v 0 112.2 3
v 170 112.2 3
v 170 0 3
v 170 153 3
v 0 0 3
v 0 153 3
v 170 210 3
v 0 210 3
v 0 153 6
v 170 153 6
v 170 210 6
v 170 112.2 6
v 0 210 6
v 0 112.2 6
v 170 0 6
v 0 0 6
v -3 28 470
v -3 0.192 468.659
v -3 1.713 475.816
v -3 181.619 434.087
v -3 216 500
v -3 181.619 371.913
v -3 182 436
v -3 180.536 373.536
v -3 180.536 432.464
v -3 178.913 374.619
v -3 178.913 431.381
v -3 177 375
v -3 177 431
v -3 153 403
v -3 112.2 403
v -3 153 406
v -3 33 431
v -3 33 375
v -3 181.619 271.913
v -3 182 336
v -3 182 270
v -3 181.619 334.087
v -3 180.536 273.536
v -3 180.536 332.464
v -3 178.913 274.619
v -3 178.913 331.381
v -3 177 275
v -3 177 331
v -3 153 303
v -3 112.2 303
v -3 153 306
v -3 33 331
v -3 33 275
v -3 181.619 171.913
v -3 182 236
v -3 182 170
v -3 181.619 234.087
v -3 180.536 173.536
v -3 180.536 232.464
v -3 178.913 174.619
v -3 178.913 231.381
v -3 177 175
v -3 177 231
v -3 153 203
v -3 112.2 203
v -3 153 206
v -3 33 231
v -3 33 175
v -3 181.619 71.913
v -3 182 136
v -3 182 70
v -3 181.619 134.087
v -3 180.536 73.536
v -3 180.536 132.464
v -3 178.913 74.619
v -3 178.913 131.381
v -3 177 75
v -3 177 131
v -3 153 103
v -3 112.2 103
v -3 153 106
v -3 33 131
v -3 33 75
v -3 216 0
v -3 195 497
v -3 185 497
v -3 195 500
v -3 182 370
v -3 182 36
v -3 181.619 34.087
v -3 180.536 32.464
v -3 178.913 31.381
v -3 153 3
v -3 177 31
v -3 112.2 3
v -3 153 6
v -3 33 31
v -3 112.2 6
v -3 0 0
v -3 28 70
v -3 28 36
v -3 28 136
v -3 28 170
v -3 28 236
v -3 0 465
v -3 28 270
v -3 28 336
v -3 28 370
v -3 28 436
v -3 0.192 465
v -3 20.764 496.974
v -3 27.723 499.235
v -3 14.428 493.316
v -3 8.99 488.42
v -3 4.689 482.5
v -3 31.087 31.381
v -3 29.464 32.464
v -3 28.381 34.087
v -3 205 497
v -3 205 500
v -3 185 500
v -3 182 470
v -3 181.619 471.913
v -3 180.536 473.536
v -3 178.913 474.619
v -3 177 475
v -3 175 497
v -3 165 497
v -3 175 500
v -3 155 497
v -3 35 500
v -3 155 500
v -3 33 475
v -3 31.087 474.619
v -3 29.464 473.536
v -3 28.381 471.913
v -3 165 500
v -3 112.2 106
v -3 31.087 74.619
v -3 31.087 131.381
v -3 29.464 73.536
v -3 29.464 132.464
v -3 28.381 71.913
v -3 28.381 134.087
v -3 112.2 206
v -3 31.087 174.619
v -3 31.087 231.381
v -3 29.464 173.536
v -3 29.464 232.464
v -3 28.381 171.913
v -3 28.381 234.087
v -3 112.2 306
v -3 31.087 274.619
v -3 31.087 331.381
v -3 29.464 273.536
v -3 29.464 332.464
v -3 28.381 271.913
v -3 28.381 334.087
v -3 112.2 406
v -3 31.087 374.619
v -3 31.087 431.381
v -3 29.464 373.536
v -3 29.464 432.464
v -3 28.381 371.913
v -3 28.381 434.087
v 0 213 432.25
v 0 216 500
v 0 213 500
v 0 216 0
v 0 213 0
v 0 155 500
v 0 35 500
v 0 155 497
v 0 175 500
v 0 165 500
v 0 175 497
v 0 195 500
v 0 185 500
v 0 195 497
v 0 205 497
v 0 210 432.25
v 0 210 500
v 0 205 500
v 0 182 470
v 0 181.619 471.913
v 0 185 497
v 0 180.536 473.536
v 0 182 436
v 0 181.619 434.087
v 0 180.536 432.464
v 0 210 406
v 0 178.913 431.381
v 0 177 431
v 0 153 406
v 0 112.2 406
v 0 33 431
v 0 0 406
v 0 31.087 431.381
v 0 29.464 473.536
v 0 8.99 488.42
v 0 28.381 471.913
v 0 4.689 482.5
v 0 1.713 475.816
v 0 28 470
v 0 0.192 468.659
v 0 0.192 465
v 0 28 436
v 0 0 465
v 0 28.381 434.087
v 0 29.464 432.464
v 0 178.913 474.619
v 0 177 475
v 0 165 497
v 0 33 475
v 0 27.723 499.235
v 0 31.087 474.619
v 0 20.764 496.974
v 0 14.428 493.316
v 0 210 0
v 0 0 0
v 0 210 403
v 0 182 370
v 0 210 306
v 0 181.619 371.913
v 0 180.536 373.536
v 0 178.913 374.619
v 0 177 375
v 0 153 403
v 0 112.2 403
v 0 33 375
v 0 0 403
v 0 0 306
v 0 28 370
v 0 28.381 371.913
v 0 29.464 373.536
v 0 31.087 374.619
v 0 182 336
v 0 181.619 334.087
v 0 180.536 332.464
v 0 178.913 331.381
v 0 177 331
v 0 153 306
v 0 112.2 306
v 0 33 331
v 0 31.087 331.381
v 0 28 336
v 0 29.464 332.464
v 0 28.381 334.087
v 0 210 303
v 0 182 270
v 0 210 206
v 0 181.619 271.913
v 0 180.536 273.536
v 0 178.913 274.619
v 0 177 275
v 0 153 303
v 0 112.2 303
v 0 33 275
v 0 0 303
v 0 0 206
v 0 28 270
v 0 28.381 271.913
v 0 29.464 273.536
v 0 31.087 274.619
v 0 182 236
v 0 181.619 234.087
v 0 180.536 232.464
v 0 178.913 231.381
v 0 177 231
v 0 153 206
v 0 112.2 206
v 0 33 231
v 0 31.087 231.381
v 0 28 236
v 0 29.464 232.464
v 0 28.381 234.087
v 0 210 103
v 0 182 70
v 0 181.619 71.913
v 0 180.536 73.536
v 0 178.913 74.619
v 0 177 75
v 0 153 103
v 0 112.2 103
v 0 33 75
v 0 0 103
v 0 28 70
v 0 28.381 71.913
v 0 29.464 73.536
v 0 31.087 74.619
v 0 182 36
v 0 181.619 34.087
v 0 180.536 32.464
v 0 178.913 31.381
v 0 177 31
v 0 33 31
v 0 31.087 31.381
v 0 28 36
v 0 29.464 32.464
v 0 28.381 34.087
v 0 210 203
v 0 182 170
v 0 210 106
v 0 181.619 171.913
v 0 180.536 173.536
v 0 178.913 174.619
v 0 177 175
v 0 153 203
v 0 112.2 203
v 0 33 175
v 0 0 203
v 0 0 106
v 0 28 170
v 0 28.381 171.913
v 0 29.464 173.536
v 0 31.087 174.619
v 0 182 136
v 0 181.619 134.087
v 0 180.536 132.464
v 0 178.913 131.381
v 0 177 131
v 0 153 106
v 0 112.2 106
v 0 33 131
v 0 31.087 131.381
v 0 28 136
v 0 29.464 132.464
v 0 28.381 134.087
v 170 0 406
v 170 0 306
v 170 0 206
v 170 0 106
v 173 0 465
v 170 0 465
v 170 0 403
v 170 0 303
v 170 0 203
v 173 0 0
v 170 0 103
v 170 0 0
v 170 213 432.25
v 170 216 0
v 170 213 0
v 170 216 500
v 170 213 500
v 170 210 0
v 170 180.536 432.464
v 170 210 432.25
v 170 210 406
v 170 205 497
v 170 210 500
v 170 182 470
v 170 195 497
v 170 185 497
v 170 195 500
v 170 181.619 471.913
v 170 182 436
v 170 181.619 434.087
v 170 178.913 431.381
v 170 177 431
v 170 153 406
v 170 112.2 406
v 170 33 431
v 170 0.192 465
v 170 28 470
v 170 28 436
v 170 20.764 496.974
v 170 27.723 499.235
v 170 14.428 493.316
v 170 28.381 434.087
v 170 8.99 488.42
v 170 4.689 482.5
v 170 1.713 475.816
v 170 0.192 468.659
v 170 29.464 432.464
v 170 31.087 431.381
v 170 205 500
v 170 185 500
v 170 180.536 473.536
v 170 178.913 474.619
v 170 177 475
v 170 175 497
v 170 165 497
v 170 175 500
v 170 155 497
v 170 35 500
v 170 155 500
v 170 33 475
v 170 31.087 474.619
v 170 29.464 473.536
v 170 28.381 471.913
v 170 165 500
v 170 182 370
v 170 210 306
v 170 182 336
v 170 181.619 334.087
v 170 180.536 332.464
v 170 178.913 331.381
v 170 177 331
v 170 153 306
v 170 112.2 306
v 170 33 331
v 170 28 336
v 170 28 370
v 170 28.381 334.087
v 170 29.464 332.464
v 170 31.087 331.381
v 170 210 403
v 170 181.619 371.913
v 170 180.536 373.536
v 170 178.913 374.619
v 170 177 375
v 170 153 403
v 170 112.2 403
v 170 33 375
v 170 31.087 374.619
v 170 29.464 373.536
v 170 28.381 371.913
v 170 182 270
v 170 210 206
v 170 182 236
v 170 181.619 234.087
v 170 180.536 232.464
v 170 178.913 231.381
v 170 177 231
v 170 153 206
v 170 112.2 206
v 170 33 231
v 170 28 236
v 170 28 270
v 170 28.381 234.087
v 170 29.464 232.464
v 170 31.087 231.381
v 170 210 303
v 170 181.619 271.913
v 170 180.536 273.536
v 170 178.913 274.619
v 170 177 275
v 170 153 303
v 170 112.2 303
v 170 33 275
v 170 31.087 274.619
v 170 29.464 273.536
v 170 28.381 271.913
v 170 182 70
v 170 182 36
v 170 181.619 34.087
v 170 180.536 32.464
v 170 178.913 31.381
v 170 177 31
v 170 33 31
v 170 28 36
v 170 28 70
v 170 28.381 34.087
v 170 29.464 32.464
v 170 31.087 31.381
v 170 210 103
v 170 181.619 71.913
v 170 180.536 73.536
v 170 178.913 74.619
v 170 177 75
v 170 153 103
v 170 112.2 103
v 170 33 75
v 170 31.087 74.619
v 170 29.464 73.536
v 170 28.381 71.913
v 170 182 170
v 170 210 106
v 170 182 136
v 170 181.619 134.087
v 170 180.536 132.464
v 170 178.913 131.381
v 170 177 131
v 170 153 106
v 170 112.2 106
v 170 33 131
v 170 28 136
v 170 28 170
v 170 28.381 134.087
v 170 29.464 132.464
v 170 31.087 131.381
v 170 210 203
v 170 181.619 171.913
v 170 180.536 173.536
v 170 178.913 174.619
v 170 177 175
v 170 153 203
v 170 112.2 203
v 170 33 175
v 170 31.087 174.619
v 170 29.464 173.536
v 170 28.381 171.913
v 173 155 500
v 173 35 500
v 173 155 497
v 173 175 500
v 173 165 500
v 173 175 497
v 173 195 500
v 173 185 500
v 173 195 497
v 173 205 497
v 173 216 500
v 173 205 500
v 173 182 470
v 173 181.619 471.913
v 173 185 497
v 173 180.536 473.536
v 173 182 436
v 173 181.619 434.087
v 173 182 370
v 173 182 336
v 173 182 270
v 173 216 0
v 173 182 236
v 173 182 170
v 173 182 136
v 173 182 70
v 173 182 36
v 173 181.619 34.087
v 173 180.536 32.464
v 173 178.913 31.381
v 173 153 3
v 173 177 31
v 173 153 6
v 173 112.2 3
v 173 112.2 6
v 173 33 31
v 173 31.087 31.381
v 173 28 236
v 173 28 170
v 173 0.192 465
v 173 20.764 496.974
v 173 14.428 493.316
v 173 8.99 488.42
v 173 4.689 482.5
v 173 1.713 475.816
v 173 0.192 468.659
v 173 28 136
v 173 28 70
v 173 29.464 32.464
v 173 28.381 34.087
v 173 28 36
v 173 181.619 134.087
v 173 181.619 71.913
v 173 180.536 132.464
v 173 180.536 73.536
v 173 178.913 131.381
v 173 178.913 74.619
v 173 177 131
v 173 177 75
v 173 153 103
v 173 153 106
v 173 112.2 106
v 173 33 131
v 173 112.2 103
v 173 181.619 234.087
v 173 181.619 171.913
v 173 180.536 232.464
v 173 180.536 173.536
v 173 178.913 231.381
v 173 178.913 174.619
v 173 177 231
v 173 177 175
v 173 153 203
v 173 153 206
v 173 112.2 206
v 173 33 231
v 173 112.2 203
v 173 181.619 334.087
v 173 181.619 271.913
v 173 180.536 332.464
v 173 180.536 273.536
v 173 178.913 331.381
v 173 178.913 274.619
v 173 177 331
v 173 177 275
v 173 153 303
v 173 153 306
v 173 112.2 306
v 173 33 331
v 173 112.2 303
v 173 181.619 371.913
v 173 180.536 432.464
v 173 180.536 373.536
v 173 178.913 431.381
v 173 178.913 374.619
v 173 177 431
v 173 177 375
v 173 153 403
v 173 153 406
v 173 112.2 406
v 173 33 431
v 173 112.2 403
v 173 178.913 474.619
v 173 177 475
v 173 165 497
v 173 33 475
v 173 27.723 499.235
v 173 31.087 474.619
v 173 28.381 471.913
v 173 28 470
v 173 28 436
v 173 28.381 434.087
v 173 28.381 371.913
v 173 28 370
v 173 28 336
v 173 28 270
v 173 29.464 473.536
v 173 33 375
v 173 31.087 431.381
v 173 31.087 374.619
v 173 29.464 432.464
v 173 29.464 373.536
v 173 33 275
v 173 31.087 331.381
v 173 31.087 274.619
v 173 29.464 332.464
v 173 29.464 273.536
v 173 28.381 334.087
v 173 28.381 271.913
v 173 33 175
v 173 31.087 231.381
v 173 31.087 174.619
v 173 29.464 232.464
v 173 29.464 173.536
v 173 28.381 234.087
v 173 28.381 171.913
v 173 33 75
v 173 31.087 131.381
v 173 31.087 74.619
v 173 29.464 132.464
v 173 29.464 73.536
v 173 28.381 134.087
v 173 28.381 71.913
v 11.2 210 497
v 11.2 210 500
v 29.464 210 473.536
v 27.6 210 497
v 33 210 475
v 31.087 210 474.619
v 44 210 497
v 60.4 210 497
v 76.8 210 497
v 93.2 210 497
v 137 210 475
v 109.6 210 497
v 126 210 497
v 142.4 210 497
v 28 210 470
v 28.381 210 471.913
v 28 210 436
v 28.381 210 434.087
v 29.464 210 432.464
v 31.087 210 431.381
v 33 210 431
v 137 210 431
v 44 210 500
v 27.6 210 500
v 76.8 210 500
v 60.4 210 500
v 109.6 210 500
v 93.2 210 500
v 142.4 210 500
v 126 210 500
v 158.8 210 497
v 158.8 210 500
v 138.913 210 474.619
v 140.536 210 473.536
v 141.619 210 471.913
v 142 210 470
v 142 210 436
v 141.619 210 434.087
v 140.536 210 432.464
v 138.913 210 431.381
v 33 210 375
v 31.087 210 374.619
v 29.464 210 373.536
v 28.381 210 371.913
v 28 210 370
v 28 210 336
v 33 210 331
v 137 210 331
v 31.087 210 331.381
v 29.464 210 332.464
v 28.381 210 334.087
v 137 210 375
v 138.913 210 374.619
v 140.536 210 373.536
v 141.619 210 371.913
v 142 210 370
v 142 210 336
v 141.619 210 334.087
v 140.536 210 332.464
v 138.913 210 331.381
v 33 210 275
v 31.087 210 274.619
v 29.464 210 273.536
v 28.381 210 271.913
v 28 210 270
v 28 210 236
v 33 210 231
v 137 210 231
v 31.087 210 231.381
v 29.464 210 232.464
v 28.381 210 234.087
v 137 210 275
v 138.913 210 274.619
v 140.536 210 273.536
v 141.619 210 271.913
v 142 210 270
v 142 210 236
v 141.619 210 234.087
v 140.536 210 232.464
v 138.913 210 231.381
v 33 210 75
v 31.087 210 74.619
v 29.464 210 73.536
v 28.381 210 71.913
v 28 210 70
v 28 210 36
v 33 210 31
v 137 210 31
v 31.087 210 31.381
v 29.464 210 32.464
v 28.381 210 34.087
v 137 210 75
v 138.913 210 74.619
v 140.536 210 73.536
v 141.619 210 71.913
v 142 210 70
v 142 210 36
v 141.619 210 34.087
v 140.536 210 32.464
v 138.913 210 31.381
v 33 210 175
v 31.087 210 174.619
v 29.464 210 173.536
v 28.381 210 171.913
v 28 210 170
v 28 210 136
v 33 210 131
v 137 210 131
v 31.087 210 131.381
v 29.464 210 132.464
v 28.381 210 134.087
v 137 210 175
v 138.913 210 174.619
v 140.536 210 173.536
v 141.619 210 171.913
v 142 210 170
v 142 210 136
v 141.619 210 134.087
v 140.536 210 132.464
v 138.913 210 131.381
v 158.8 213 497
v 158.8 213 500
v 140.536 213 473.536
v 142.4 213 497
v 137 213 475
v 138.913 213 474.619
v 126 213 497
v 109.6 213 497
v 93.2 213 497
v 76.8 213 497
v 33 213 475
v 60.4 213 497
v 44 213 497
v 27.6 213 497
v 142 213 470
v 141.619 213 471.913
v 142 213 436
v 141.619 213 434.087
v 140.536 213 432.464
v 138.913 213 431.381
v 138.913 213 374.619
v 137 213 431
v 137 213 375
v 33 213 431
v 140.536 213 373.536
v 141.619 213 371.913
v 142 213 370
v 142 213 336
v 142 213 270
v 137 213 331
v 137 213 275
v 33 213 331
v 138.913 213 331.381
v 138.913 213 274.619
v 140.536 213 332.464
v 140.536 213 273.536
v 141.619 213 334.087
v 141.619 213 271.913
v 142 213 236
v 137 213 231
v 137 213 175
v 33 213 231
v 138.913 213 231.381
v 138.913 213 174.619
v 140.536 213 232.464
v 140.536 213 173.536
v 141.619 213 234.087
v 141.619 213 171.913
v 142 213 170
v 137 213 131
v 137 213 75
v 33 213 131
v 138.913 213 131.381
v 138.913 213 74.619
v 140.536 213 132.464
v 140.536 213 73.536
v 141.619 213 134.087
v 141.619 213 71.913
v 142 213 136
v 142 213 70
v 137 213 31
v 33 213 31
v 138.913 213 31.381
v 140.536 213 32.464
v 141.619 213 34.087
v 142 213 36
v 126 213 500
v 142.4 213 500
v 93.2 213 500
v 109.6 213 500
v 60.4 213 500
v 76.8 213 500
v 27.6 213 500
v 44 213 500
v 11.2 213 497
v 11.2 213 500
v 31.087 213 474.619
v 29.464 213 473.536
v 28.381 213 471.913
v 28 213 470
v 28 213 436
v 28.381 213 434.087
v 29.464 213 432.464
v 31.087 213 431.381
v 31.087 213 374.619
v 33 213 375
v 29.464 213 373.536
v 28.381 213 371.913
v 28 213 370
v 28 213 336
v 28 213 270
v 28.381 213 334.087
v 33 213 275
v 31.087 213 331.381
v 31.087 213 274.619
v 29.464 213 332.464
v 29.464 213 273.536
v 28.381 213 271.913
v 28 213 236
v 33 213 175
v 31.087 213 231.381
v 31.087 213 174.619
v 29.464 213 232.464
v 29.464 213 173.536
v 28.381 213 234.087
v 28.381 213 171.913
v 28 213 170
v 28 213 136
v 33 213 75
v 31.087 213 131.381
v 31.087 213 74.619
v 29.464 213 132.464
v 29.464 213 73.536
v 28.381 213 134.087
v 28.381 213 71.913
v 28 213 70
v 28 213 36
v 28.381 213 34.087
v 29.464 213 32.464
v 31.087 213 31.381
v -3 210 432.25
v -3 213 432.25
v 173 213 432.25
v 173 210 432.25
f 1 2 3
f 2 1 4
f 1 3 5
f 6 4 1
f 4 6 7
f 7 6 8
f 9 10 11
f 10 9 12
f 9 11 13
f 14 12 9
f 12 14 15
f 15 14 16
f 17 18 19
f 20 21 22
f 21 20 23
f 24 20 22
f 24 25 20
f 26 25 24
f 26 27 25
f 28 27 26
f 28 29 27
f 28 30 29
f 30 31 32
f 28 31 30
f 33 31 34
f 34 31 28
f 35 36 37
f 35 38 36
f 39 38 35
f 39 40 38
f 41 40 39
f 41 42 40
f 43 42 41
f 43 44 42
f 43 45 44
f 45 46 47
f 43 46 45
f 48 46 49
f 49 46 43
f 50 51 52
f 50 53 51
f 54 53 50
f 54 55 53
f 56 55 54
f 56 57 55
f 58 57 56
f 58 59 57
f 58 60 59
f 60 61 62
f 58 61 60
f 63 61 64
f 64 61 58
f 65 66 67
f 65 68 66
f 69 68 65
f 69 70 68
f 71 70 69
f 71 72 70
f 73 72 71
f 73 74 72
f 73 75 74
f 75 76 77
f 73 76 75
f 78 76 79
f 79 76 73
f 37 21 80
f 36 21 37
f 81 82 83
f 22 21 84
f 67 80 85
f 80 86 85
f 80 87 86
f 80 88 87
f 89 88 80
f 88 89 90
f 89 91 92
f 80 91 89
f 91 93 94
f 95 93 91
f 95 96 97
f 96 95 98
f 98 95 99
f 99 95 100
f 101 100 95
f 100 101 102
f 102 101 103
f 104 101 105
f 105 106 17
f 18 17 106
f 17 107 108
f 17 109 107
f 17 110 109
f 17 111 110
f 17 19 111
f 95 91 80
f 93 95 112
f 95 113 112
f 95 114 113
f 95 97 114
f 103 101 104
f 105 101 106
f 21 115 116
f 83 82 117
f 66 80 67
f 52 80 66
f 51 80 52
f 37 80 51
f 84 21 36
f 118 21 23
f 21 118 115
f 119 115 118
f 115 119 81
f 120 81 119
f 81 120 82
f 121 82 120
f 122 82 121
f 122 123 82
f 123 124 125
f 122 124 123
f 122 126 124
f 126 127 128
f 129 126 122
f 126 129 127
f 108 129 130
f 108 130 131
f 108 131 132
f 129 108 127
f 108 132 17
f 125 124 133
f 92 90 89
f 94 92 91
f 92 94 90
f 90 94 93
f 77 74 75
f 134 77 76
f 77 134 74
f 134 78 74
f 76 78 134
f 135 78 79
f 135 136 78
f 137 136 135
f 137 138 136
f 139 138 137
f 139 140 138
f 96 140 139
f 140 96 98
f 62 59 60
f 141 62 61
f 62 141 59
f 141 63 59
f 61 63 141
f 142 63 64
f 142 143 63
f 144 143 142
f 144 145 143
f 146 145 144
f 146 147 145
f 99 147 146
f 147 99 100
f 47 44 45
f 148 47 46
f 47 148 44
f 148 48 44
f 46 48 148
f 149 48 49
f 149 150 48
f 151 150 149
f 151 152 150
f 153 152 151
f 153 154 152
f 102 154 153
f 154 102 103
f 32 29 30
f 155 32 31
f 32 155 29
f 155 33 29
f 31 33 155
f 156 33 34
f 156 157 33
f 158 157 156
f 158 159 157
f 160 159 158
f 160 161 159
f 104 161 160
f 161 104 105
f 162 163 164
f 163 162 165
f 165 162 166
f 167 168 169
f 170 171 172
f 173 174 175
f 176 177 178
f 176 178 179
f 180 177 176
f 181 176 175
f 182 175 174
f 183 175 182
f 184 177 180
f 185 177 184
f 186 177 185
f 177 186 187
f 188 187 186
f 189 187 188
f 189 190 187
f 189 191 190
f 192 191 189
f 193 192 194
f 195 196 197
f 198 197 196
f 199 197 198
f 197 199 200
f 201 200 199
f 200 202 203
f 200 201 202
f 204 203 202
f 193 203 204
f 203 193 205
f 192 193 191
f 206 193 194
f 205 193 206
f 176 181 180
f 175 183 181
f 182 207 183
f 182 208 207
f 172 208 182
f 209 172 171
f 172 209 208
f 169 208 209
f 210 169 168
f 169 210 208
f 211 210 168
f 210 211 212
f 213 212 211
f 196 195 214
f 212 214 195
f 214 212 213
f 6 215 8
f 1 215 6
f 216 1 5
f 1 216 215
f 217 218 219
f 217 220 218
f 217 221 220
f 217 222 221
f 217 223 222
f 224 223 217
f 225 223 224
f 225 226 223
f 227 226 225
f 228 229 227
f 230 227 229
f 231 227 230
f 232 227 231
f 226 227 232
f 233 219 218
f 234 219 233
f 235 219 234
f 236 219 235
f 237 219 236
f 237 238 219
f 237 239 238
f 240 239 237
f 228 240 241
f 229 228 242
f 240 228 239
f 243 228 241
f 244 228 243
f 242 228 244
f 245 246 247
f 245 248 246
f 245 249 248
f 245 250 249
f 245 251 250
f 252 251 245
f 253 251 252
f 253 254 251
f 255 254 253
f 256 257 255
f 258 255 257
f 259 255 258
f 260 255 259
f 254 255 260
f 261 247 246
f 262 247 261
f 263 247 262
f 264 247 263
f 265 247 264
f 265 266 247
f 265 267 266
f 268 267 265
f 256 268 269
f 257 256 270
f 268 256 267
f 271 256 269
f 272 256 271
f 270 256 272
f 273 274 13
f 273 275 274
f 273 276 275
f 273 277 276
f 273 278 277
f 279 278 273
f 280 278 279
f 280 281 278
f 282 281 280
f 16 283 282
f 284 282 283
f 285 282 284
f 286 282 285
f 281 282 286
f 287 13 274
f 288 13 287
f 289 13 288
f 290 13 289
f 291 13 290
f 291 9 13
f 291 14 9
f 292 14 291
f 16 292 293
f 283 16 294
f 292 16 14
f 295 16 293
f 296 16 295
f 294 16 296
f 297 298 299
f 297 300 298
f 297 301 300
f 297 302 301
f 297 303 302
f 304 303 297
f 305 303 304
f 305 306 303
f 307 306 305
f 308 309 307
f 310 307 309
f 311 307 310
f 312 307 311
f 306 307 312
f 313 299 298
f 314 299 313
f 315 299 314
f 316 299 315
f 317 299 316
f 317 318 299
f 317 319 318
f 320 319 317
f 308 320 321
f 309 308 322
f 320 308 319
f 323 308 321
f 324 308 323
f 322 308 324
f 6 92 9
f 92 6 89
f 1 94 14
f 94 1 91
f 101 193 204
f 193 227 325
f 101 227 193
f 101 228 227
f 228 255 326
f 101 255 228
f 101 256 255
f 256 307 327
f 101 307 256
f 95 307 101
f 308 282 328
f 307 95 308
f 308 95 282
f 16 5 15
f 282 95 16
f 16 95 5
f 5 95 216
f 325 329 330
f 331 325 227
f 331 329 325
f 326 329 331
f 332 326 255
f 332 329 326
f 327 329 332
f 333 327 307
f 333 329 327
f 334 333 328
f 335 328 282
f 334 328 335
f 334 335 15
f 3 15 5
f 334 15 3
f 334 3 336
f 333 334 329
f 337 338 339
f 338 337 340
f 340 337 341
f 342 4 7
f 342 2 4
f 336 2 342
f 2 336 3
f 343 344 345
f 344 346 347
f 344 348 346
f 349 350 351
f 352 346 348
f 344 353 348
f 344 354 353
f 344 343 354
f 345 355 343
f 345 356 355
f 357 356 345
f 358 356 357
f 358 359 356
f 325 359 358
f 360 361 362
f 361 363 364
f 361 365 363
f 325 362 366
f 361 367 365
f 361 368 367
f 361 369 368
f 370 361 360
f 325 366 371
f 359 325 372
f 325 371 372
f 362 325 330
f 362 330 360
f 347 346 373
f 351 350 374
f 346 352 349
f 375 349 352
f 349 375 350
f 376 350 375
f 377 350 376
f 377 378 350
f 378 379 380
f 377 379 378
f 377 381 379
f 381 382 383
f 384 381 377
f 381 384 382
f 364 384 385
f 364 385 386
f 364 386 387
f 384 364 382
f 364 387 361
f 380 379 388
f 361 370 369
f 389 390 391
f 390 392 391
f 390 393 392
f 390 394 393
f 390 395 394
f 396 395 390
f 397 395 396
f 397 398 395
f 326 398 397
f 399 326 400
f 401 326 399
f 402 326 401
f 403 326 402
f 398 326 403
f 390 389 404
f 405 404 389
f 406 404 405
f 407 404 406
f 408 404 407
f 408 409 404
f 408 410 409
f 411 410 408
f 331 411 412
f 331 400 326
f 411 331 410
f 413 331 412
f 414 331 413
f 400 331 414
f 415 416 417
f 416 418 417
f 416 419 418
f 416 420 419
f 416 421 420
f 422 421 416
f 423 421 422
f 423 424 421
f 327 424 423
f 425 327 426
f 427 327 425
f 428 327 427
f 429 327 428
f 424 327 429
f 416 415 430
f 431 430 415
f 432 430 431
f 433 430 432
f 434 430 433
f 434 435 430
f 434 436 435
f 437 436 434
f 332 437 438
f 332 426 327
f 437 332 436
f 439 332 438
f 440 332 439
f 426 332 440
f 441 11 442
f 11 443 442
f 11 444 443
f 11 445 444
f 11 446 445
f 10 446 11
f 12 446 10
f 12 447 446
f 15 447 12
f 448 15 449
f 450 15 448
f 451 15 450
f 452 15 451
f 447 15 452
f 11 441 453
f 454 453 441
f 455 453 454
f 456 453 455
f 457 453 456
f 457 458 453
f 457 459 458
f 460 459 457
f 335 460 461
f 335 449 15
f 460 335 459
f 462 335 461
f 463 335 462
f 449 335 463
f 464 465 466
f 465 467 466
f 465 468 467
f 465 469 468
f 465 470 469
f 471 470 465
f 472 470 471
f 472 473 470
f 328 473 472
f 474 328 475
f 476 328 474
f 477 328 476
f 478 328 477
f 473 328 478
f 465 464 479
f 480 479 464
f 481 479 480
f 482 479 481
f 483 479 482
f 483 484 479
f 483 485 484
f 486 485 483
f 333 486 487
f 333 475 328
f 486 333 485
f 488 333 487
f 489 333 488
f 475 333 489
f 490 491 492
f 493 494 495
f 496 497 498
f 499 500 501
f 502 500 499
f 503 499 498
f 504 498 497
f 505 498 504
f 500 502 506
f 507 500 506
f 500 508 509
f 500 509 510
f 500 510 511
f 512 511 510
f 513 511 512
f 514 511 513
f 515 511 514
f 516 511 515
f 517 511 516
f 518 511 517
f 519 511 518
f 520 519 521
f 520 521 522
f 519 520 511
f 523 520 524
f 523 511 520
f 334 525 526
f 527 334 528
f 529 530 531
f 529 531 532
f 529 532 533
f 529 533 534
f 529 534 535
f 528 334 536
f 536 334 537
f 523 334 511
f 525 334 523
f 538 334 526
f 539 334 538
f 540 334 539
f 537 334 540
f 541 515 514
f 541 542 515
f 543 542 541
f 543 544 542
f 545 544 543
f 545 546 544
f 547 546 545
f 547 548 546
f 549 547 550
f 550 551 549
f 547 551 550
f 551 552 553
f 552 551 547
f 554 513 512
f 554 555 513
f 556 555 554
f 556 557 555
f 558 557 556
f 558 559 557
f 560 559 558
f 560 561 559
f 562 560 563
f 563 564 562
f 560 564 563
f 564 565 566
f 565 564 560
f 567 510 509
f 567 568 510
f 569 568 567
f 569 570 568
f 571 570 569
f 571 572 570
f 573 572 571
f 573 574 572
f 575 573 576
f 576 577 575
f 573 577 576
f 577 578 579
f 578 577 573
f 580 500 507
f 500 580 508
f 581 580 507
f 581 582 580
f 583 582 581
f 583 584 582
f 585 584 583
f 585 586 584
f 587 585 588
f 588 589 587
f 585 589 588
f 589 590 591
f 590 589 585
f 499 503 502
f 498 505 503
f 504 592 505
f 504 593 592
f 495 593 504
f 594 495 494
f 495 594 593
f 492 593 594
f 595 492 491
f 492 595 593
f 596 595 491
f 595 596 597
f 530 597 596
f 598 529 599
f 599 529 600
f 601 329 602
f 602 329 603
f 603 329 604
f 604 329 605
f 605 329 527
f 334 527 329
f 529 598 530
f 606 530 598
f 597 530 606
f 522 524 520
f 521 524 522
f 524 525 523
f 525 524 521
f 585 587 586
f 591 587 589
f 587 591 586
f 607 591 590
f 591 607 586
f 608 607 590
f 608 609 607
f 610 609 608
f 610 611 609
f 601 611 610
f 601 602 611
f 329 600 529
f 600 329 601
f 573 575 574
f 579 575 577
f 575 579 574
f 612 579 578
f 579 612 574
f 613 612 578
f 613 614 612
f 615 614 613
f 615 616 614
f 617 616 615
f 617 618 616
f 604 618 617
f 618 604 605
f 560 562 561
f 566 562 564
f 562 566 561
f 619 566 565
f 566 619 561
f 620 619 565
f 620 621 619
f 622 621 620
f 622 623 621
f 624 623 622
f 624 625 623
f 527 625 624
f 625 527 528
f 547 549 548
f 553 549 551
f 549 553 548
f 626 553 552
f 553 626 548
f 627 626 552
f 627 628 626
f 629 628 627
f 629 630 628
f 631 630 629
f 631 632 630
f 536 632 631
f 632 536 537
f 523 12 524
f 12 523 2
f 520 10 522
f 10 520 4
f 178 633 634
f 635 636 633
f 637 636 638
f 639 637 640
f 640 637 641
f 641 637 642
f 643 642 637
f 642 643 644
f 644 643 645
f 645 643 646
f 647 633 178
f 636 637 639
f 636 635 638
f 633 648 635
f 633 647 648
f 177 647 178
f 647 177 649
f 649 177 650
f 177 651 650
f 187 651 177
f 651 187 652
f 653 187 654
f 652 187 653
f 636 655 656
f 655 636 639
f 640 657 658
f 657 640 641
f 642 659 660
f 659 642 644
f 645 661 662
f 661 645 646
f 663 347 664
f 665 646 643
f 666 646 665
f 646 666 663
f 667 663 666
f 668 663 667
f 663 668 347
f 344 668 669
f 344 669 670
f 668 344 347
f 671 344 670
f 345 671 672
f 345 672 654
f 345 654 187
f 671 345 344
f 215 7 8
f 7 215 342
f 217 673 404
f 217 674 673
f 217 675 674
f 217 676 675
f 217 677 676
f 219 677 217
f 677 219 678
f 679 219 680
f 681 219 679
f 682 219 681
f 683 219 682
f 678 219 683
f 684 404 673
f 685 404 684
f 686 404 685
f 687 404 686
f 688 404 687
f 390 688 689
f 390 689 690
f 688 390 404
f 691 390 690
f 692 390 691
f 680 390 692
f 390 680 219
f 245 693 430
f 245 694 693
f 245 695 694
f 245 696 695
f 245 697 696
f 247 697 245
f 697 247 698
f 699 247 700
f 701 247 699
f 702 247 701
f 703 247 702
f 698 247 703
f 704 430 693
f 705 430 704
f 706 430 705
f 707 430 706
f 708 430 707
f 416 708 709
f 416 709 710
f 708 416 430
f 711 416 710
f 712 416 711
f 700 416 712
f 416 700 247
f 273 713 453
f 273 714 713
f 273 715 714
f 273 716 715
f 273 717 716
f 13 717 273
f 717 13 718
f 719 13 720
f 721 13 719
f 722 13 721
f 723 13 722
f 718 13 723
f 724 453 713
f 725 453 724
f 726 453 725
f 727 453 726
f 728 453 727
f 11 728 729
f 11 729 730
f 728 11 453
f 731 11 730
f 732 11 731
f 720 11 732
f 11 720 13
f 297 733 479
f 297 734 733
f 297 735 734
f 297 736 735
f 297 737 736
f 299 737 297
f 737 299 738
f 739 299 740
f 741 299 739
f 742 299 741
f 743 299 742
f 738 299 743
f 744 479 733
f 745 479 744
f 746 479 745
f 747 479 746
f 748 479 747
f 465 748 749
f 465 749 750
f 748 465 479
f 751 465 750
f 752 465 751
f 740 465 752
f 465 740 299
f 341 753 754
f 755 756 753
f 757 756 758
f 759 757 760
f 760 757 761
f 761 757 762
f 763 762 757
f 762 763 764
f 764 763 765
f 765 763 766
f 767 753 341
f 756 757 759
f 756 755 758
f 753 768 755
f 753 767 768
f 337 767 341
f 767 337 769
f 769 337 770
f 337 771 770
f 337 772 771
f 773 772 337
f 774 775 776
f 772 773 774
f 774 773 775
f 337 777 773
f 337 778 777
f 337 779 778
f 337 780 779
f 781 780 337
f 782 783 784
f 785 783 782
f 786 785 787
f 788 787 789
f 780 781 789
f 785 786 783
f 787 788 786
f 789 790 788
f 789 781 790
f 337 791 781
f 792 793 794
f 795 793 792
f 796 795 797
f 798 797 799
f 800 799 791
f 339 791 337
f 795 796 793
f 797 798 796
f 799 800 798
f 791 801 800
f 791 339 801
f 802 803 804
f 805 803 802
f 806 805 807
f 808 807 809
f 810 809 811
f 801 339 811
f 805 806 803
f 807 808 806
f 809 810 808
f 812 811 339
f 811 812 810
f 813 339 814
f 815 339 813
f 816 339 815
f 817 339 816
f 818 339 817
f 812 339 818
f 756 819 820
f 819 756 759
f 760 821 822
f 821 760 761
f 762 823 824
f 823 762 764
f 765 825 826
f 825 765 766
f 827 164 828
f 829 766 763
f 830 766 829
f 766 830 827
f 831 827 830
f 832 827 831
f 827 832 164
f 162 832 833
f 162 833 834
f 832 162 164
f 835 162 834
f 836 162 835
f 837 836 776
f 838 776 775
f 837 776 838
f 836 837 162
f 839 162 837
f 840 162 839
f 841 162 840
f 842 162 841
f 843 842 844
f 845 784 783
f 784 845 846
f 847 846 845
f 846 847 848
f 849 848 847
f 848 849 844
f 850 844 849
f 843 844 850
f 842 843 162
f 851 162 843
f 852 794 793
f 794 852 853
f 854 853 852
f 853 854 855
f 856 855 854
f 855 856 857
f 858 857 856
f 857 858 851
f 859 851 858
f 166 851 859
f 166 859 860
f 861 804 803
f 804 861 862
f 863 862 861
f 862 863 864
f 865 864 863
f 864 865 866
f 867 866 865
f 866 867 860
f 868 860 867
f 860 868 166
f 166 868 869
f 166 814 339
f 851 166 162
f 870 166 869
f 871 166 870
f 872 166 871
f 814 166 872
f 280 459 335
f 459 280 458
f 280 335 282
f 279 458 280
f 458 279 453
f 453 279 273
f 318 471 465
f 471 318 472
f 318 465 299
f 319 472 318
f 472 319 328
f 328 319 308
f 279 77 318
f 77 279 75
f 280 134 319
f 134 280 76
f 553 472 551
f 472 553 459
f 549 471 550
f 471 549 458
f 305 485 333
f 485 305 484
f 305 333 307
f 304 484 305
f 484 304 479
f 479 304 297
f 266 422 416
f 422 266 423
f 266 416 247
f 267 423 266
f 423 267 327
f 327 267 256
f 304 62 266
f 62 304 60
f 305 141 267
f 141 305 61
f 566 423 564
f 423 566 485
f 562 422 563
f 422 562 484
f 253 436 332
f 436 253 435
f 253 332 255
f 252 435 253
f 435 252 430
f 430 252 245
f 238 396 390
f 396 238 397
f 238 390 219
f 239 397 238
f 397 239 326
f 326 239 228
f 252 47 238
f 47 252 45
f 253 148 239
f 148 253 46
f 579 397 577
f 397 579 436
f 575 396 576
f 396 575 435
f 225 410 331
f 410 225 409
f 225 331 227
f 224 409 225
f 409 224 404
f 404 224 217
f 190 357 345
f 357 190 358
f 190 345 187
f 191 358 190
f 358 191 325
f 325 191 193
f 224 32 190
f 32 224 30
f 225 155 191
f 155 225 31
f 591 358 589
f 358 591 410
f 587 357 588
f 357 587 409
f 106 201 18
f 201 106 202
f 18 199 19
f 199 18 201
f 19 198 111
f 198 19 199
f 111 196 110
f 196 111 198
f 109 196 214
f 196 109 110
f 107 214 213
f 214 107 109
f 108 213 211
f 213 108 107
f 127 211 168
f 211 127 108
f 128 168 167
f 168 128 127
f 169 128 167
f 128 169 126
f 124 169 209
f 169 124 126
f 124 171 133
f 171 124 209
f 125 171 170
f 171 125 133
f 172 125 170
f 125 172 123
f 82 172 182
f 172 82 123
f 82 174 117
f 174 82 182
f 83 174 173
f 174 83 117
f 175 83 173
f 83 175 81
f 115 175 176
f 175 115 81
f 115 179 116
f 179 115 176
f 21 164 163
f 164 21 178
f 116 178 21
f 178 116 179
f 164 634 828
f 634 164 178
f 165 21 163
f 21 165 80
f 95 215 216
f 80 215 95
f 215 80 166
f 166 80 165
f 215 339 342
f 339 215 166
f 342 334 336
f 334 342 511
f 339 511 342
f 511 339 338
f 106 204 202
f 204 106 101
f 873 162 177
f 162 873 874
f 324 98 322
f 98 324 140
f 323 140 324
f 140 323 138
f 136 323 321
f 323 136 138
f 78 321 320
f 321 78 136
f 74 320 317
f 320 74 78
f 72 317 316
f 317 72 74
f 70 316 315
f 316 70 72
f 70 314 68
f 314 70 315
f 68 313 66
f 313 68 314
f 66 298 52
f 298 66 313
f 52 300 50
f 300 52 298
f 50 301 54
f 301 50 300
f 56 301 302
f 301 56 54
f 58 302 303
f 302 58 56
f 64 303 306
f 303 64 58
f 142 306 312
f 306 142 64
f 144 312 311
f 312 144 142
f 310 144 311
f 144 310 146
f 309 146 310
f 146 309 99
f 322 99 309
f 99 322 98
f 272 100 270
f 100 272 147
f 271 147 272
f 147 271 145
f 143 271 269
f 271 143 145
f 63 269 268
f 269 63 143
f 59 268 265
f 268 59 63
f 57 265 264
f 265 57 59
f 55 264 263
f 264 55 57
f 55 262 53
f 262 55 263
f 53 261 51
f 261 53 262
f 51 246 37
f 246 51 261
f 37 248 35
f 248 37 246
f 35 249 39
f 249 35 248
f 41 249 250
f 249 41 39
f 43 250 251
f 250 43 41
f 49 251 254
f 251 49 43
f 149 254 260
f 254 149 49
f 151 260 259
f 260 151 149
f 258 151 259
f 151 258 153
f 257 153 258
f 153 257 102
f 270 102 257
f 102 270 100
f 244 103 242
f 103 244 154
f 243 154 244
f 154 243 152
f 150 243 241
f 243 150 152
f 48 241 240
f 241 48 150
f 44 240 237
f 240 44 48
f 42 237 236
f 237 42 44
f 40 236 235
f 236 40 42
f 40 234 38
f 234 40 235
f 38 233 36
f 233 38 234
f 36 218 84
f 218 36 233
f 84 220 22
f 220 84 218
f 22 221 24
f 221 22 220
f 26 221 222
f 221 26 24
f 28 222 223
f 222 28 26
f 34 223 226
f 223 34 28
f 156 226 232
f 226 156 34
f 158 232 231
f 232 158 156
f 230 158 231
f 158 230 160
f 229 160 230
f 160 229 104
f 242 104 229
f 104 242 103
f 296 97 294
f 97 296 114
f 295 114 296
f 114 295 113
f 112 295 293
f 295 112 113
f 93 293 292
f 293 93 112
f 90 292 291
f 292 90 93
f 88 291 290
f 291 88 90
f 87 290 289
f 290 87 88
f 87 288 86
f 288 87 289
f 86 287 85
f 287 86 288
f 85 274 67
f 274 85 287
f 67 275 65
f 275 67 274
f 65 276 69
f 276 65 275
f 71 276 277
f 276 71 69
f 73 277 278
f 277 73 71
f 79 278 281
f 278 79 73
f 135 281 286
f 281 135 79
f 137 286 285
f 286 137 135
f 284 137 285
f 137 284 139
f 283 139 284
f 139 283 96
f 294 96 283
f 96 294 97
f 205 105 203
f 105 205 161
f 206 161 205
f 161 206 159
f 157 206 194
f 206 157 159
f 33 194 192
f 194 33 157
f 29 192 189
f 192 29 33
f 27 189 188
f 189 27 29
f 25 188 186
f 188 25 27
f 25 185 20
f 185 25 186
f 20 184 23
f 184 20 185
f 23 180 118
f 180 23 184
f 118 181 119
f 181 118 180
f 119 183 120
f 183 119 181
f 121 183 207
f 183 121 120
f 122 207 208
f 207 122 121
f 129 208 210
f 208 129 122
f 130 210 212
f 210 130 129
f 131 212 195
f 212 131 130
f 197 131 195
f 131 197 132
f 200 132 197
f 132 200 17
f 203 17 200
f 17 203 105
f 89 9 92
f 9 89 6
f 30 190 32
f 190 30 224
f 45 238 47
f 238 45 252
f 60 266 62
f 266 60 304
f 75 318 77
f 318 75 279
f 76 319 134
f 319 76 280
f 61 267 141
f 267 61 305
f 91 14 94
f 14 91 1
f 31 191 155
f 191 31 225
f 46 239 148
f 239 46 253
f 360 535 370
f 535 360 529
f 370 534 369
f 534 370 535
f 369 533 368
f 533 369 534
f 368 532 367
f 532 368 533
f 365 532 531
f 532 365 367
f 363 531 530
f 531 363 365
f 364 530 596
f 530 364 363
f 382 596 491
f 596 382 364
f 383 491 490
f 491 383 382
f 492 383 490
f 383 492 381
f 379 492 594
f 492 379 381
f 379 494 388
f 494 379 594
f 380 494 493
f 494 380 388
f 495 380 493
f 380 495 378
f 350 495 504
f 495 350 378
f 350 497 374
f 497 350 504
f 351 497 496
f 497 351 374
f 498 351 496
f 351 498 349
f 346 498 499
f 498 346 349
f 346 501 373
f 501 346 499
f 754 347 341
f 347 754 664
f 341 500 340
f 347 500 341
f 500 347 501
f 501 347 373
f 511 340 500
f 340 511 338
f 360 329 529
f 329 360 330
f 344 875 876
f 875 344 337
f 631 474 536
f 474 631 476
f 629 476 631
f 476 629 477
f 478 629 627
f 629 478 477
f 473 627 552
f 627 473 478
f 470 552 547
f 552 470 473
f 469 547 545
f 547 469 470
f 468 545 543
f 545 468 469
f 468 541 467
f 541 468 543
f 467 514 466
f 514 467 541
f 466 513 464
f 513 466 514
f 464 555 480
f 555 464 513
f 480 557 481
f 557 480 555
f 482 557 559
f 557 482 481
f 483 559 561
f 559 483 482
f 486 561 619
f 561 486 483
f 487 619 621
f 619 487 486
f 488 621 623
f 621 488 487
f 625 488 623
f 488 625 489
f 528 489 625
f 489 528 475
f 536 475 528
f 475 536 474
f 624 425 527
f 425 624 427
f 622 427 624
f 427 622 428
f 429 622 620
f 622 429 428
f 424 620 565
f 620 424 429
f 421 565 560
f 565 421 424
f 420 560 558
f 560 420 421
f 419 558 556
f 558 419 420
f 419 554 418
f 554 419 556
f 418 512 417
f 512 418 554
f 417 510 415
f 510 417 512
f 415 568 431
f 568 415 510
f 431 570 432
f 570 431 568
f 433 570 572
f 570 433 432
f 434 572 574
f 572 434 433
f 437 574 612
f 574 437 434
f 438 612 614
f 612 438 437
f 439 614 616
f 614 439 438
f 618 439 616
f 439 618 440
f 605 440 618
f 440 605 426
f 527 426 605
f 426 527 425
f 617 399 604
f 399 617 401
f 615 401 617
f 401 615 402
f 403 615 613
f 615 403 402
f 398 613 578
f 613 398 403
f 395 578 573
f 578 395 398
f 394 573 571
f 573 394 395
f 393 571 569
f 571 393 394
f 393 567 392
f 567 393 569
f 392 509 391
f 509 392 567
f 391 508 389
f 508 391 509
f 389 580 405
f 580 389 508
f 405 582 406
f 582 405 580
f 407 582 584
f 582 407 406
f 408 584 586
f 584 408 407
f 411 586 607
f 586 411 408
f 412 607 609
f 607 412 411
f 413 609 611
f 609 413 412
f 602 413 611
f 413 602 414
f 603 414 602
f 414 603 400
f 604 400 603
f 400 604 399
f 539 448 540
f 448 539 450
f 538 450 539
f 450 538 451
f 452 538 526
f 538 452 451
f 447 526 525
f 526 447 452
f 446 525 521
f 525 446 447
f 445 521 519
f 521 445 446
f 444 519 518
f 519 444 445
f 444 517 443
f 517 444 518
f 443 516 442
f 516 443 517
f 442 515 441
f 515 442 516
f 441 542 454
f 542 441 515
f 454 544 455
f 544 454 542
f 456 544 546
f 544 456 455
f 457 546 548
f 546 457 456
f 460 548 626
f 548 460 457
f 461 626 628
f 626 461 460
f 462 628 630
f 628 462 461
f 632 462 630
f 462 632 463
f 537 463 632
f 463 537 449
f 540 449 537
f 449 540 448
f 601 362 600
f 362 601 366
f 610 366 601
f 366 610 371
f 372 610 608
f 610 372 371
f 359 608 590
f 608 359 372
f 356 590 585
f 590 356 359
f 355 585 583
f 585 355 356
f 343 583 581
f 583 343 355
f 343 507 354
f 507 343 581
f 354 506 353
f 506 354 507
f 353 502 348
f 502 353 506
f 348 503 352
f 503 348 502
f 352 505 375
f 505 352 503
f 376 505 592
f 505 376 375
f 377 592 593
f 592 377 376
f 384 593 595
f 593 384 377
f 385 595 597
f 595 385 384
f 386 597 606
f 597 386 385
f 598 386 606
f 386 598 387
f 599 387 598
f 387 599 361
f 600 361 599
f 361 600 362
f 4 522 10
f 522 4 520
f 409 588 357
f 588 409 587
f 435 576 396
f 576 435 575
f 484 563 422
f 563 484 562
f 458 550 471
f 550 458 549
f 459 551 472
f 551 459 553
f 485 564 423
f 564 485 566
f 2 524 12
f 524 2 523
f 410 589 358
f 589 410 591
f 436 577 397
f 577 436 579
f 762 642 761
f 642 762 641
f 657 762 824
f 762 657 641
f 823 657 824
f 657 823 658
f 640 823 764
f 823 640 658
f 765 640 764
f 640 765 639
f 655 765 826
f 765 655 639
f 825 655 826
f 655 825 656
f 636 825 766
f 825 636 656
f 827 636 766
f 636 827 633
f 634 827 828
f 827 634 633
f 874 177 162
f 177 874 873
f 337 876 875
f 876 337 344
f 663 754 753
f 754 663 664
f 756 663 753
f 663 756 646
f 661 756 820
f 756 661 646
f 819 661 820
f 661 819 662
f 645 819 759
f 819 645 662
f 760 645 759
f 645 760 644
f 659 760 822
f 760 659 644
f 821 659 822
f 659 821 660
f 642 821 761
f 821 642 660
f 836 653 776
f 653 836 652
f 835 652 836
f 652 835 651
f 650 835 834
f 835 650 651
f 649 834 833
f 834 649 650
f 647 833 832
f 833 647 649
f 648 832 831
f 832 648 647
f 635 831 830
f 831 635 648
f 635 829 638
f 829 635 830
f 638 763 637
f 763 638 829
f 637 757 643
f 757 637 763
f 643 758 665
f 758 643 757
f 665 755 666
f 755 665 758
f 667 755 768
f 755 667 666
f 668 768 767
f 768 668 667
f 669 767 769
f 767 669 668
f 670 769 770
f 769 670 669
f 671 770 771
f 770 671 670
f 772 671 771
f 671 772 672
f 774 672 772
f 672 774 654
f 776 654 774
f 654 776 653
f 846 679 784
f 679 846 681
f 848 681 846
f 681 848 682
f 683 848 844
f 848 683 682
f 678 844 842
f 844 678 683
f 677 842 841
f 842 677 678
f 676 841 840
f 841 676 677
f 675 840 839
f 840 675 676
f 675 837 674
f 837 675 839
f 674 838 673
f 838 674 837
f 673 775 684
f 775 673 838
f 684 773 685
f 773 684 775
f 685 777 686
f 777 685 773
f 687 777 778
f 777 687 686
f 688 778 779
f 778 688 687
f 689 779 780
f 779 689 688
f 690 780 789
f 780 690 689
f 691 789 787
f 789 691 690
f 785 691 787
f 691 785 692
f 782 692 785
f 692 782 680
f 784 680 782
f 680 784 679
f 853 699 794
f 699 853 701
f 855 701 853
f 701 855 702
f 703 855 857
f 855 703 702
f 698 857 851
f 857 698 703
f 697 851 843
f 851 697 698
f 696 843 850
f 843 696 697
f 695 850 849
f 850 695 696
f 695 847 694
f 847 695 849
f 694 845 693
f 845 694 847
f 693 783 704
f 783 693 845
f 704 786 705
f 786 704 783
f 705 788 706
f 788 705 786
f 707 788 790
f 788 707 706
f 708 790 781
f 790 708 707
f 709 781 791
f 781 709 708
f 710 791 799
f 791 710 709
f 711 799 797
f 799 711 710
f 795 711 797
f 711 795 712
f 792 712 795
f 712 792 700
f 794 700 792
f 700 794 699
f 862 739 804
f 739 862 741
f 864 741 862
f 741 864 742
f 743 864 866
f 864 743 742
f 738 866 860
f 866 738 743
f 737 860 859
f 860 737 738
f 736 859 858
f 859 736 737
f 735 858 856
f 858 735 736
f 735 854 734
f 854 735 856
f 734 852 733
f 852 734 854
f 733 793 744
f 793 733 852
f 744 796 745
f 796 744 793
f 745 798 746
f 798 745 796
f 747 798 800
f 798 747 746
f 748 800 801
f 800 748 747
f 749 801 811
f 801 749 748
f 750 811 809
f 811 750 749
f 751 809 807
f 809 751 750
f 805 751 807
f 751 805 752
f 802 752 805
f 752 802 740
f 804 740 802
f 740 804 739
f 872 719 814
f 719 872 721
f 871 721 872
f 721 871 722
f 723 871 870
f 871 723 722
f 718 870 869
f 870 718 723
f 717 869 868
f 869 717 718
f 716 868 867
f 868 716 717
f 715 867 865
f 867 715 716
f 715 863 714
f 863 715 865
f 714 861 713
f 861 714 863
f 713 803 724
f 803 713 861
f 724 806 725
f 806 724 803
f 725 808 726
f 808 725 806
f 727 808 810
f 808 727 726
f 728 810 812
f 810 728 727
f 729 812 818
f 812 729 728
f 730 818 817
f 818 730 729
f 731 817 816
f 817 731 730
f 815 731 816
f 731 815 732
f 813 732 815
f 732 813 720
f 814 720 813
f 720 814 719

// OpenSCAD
////////////////////////////////////////////////////////////////////////////////////////////////////////////////
/// this script generates the cutting sketch for you laser cutter or cnc to make a desk shelves ////
// These shelves have been made initialy to hold my solder iron lab power supply pliers etc... ///
////////////////////////////////////////////////////////////////////////////////////////////////////////////////
//////////////////////////////// This script has been made by iX. ////////////////////////////////////////
//////// I've learnt openscad at Laboratoire Ouvert Grenoblois the Grenoble's hackerspace /////////
////////////////////////////// https://www.logre.eu/wiki/Accueil /////////////////////////////////////////
///////// can be found on thingiverse "maker desk shelves for laser cutter"  ////////////////////////
////////////////////////////////////////////////////////////////////////////////////////////////////////////////
////////////////// For bug repport, suggestions, say thank you, send me money //////////////////////
/////////////////////////// you can reach me at xbranca@gmail.com ///////////////////////////////////
////////////////////////////////////////////////////////////////////////////////////////////////////////////////
///////////// This is a remix from Mr clifford "Parametric Desktop Filing Rack"  ///////////////////
//////////////////////// https://www.thingiverse.com/thing:3084 ////////////////////////////////////////
///////////////////////// Thank you very much to him :) ////////////////////////////////////////////////
////////////////////////////////////////////////////////////////////////////////////////////////////////////////
///////////////  This is licensed as " 2-Clause BSD License " .. deal with it ! ///////////////////////
///////////////////////// https://opensource.org/licenses/bsd-license.php ///////////////////////////////
//////////////////////////////////////////////////////////////////////////////////////////////////////////////

/*
THIS SOFTWARE IS PROVIDED BY THE COPYRIGHT HOLDERS AND CONTRIBUTORS "AS IS" AND ANY EXPRESS OR IMPLIED WARRANTIES, INCLUDING, BUT NOT LIMITED TO, THE IMPLIED WARRANTIES OF MERCHANTABILITY AND FITNESS FOR A PARTICULAR PURPOSE ARE DISCLAIMED. IN NO EVENT SHALL THE COPYRIGHT HOLDER OR CONTRIBUTORS BE LIABLE FOR ANY DIRECT, INDIRECT, INCIDENTAL, SPECIAL, EXEMPLARY, OR CONSEQUENTIAL DAMAGES (INCLUDING, BUT NOT LIMITED TO, PROCUREMENT OF SUBSTITUTE GOODS OR SERVICES; LOSS OF USE, DATA, OR PROFITS; OR BUSINESS INTERRUPTION) HOWEVER CAUSED AND ON ANY THEORY OF LIABILITY, WHETHER IN CONTRACT, STRICT LIABILITY, OR TORT (INCLUDING NEGLIGENCE OR OTHERWISE) ARISING IN ANY WAY OUT OF THE USE OF THIS SOFTWARE, EVEN IF ADVISED OF THE POSSIBILITY OF SUCH DAMAGE.
*/

////////////////////////////////////////////////////////////////////////////////
//select the mode you want to render
// shapes --> 2D cutting view to export in dxf
// 3Dview --> rendering of the desk shelves once assembled
// test --> test mode in case you wanna display only one element to modify it
mode =
//	"shapes";
	"3dview";
//  "test";

////////////////////////////////////////////////////////////////////////////////
// Your shelves parameters

//number of shelves you want
num_shelves = 4;
//extra height on top of the upper shelf
extra_h = 100;
//Half diameter of the ronded angle of the upper self
round_r = 35;

//dimensions
shelf_width = 170;
shelf_depth = 210;
shelf_h = 100;

//depth of the tool older
top_tool_holder_depth = 60;

total_h = num_shelves*shelf_h + extra_h;
echo("total_h =",total_h);

//set the thickness of the material you wanna use
thickness = 3;

// number of locks in each direction
locks_h = 10;
locks_d = 5;
locks_w = 5;
nb_locks_top = 3;

//screw_drivers
nb_screw_drivers = 6;
diameter_screw_drivers = 6;
dist_screw_driver_to_edge = 12;

// amount of wood around pliers holders
margin_around_pliers = 5;

// number cases on the tool holder
nb_case = 6;

//size of window edges
//define the amout of wood let around the windows opened on side and back of the shelves
window_edges = 25;
//rounds around the shelves
window_round = 5;

//////////////////////////////////////////////////////////////////////////////////////
////////////////////// internal script computation ///////////////////////////////
// You shouldn't have to midify it unless you wanna hack this script //////
//////////////////////////////////////////////////////////////////////////////////////

//pliers_case_size = (top_tool_holder_depth - diameter_screw_drivers - 15 -10)/2 ;
pliers_case_size_x = (shelf_width - (nb_case+1)*margin_around_pliers)/nb_case ;
pliers_case_size_y = (top_tool_holder_depth - 2*dist_screw_driver_to_edge - diameter_screw_drivers/2 - 1*margin_around_pliers) /2 ;

//compute size of Z/h locks
//locks_h = nb_of_lock_z;
locks_width_h = (total_h - (2*thickness))/(2*locks_h);
// security to guarantee lock_width >= thickness
if(locks_width_h<thickness) {locks_width_h=thickness;}; 

//compute size of Y/W locks
//locks_w = nb_of_lock_y;
locks_width_w = (shelf_width - (2*thickness))/(2*locks_w);
// security to guarantee lock_width >= thickness
if(locks_width_w<thickness) {locks_width_w=thickness;}; 

//compute size of x/d locks
//locks_d = nb_of_lock_x;
locks_width_d = (shelf_depth - (2*thickness))/(2*locks_d);
// security to guarantee lock_width >= thickness
if(locks_width_d<thickness) {locks_width_d=thickness;}; 

locks_top_tool = (top_tool_holder_depth)/(2*nb_locks_top);
if(locks_top_tool<thickness) {locks_top_tool=thickness;}; 

explode = (sin($t*360 - 90)+1)*10;

function shelf_hpos(i) = thickness + i*shelf_h;

//////////////////////////////////////////////////////////////////////////////////////
//////////////////////////////// Modules //////////////////////////////////////////
// You shouldn't have to midify it unless you wanna hack this script //////
//////////////////////////////////////////////////////////////////////////////////////

module backside()
{
	difference() {
			union(){
				//initial square	
				square([ shelf_width, total_h ]);
				//side locks
				for (i = [0:(locks_h)-1]) {
					translate([ 0, (locks_width_h/2) + (locks_width_h)*(2*i) ]) {
							translate([ -thickness, 0 ]) square([ thickness*2, locks_width_h ]);
							translate([ shelf_width-thickness, 0 ]) square([ thickness*2, locks_width_h ]);
					}
				}
			}
			//remove locks for shelves and top tools
			for (i  = [0:num_shelves]) {
				for (j  = [0:locks_w-1]){
					//locks for shelves
					translate([ (thickness + locks_width_w/2) + (locks_width_w)*(2*j), shelf_hpos(i) ])
						square([ locks_width_w, thickness ]);
					//locks for top tools
					translate([ (thickness + locks_width_w/2) + (locks_width_w)*(2*j), total_h - thickness ])
						square([ locks_width_w, thickness ]);
				}
				//Opens windows into backside
				translate([ (1*thickness) + window_edges + window_round, (1*thickness) + window_edges + window_round + shelf_hpos(i) ])
				minkowski(){
				  	square([ shelf_width - (2*window_edges) - (2*thickness) - (2*window_round), shelf_h - (2*window_edges) - (2*thickness) - (2*window_round) ]);
					circle(r=window_round,h=thickness);
				}
			}
	}
}

module shelf()
{
	square([ shelf_width, shelf_depth]);
	for (i = [0:locks_d-1]) {
		translate([ 0, (locks_width_d/2) + (locks_width_d)*(2*i) ]) {
			translate([ -thickness, 0 ]) square([ thickness*2, locks_width_d ]);
			translate([ shelf_width-thickness, 0 ]) square([ thickness*2, locks_width_d ]);
		}
	}
	for (j  = [0:locks_w-1])
		translate([ thickness + (locks_width_w/2) + (locks_width_w)*(2*j), shelf_depth ])
			square([ locks_width_w, thickness ]);
}

module side()
{
	difference() {
		//initial square
		square([ total_h, shelf_depth+thickness*2 ]);
		
		//remove all locks for shelves qnd open windows
		for (i  = [0:num_shelves]) {
			//remove locks for shelves
			for (j  = [0:locks_d-1])
				translate([ shelf_hpos(i), (locks_width_d/2) + (locks_width_d)*(2*j) ])
				square([ thickness, locks_width_d ]);
			//Opens windows into side
				translate([ (1*thickness) + window_edges + window_round + shelf_hpos(i), (1*thickness) + window_edges + window_round, ])
				minkowski(){
				  	square([ shelf_h - (2*window_edges) - (2*thickness) - (2*window_round), shelf_depth - (2*window_edges) - (2*thickness) - (2*window_round) ]);
					circle(r=window_round,h=thickness);
			}
		}		
		
		//remove locks for backside
		for (i = [0:locks_h-1]) {
			translate([ (locks_width_h/2) + (locks_width_h)*(2*i), shelf_depth ]) 
				square([ locks_width_h, thickness ]);
		}

		//perform rounding on top front
		translate([ total_h-round_r, -round_r ])
		difference() {
			square(round_r*2);
			translate([ 0, round_r*2]) circle(round_r);
		}

		//open locks on top for tools
		translate([ total_h - thickness, shelf_depth +(0*thickness) + (locks_top_tool/2) - top_tool_holder_depth]) 
				for (i = [0:nb_locks_top-1]) {
					translate([0, 2*i*locks_top_tool ]) square([2*thickness, locks_top_tool]);
				}
	}
}

module top_tools_holder()
{
	difference(){
		union(){
			square([ shelf_width, top_tool_holder_depth]);
			//Side locks of top tool holder
			for (i = [0:nb_locks_top-1]) {
				translate([ 0, (locks_top_tool/2) + (locks_top_tool)*(2*i) ]) {
					translate([ -thickness, 0 ]) square([ thickness*2, locks_top_tool ]);
					translate([ shelf_width-thickness, 0 ]) square([ thickness*2, locks_top_tool ]);
				}
			}
			//backside locks
			for (j  = [0:locks_w-1])
				translate([ thickness + (locks_width_w/2) + (locks_width_w)*(2*j), top_tool_holder_depth ])
					square([ locks_width_w, thickness ]);
		}
		
		// holes for screw drivers 
		for(i=[1:nb_screw_drivers]) translate([ i*(shelf_width/(nb_screw_drivers+1)), top_tool_holder_depth - dist_screw_driver_to_edge]) circle(d=diameter_screw_drivers, center=true);
		
		//cases for pliers or whatever
		
		for(i=[0:nb_case-1]) translate([ margin_around_pliers + i*(pliers_case_size_x+margin_around_pliers), 2*margin_around_pliers + pliers_case_size_y]) square([pliers_case_size_x, pliers_case_size_y]);
		for(i=[0:nb_case-1]) translate([ margin_around_pliers + i*(pliers_case_size_x +margin_around_pliers), margin_around_pliers ]) square([pliers_case_size_x, pliers_case_size_y]);
	}
}
//top_tool_holder_depth - 2*dist_screw_driver_to_edge - diameter_screw_drivers/2 - 2*pliers_case_size_y - margin_around_pliers



//////////////////////////////////////////////////////////////////////////////////////
/////////////////////////////// Renderings ////////////////////////////////////////
// You shouldn't have to midify it unless you wanna hack this script //////
//////////////////////////////////////////////////////////////////////////////////////

if (mode == "shapes") {
	translate([ -shelf_width -3*thickness, shelf_depth+thickness*3 ]) backside();
	translate([ -shelf_width -3*thickness, 0 ]) shelf();
	side();
	translate([ total_h + 2*thickness, shelf_depth - top_tool_holder_depth ]) top_tools_holder();
}

if (mode == "3dview") {
	color([ 0.3, 0.7, 0.3 ]) for (i = [0:num_shelves])
		translate([ 0, 0, shelf_hpos(i) ]) linear_extrude(height = thickness) shelf();
	color([ 0.7, 0.3, 0.7 ]) for (i = [0:1])
		translate([ i*(shelf_width+thickness) - explode + i*2*explode, 0, 0 ]) rotate([ 0, -90, 0 ])
			linear_extrude(height = thickness) side();
	color([ 0.7, 0.3, 0.3 ]) translate([ 0, shelf_depth+thickness + explode, 0 ]) rotate([ 90, 0, 0 ])
			linear_extrude(height = thickness) backside();
	color([ 0.5, 0.5, 0.5 ]) 
		translate([ 0, shelf_depth - top_tool_holder_depth, total_h ]) rotate([ 0, 0, 0 ]) top_tools_holder();
}

if (mode == "test") {
	//backside();
	//shelf();
    //side();
	top_tools_holder();
}
